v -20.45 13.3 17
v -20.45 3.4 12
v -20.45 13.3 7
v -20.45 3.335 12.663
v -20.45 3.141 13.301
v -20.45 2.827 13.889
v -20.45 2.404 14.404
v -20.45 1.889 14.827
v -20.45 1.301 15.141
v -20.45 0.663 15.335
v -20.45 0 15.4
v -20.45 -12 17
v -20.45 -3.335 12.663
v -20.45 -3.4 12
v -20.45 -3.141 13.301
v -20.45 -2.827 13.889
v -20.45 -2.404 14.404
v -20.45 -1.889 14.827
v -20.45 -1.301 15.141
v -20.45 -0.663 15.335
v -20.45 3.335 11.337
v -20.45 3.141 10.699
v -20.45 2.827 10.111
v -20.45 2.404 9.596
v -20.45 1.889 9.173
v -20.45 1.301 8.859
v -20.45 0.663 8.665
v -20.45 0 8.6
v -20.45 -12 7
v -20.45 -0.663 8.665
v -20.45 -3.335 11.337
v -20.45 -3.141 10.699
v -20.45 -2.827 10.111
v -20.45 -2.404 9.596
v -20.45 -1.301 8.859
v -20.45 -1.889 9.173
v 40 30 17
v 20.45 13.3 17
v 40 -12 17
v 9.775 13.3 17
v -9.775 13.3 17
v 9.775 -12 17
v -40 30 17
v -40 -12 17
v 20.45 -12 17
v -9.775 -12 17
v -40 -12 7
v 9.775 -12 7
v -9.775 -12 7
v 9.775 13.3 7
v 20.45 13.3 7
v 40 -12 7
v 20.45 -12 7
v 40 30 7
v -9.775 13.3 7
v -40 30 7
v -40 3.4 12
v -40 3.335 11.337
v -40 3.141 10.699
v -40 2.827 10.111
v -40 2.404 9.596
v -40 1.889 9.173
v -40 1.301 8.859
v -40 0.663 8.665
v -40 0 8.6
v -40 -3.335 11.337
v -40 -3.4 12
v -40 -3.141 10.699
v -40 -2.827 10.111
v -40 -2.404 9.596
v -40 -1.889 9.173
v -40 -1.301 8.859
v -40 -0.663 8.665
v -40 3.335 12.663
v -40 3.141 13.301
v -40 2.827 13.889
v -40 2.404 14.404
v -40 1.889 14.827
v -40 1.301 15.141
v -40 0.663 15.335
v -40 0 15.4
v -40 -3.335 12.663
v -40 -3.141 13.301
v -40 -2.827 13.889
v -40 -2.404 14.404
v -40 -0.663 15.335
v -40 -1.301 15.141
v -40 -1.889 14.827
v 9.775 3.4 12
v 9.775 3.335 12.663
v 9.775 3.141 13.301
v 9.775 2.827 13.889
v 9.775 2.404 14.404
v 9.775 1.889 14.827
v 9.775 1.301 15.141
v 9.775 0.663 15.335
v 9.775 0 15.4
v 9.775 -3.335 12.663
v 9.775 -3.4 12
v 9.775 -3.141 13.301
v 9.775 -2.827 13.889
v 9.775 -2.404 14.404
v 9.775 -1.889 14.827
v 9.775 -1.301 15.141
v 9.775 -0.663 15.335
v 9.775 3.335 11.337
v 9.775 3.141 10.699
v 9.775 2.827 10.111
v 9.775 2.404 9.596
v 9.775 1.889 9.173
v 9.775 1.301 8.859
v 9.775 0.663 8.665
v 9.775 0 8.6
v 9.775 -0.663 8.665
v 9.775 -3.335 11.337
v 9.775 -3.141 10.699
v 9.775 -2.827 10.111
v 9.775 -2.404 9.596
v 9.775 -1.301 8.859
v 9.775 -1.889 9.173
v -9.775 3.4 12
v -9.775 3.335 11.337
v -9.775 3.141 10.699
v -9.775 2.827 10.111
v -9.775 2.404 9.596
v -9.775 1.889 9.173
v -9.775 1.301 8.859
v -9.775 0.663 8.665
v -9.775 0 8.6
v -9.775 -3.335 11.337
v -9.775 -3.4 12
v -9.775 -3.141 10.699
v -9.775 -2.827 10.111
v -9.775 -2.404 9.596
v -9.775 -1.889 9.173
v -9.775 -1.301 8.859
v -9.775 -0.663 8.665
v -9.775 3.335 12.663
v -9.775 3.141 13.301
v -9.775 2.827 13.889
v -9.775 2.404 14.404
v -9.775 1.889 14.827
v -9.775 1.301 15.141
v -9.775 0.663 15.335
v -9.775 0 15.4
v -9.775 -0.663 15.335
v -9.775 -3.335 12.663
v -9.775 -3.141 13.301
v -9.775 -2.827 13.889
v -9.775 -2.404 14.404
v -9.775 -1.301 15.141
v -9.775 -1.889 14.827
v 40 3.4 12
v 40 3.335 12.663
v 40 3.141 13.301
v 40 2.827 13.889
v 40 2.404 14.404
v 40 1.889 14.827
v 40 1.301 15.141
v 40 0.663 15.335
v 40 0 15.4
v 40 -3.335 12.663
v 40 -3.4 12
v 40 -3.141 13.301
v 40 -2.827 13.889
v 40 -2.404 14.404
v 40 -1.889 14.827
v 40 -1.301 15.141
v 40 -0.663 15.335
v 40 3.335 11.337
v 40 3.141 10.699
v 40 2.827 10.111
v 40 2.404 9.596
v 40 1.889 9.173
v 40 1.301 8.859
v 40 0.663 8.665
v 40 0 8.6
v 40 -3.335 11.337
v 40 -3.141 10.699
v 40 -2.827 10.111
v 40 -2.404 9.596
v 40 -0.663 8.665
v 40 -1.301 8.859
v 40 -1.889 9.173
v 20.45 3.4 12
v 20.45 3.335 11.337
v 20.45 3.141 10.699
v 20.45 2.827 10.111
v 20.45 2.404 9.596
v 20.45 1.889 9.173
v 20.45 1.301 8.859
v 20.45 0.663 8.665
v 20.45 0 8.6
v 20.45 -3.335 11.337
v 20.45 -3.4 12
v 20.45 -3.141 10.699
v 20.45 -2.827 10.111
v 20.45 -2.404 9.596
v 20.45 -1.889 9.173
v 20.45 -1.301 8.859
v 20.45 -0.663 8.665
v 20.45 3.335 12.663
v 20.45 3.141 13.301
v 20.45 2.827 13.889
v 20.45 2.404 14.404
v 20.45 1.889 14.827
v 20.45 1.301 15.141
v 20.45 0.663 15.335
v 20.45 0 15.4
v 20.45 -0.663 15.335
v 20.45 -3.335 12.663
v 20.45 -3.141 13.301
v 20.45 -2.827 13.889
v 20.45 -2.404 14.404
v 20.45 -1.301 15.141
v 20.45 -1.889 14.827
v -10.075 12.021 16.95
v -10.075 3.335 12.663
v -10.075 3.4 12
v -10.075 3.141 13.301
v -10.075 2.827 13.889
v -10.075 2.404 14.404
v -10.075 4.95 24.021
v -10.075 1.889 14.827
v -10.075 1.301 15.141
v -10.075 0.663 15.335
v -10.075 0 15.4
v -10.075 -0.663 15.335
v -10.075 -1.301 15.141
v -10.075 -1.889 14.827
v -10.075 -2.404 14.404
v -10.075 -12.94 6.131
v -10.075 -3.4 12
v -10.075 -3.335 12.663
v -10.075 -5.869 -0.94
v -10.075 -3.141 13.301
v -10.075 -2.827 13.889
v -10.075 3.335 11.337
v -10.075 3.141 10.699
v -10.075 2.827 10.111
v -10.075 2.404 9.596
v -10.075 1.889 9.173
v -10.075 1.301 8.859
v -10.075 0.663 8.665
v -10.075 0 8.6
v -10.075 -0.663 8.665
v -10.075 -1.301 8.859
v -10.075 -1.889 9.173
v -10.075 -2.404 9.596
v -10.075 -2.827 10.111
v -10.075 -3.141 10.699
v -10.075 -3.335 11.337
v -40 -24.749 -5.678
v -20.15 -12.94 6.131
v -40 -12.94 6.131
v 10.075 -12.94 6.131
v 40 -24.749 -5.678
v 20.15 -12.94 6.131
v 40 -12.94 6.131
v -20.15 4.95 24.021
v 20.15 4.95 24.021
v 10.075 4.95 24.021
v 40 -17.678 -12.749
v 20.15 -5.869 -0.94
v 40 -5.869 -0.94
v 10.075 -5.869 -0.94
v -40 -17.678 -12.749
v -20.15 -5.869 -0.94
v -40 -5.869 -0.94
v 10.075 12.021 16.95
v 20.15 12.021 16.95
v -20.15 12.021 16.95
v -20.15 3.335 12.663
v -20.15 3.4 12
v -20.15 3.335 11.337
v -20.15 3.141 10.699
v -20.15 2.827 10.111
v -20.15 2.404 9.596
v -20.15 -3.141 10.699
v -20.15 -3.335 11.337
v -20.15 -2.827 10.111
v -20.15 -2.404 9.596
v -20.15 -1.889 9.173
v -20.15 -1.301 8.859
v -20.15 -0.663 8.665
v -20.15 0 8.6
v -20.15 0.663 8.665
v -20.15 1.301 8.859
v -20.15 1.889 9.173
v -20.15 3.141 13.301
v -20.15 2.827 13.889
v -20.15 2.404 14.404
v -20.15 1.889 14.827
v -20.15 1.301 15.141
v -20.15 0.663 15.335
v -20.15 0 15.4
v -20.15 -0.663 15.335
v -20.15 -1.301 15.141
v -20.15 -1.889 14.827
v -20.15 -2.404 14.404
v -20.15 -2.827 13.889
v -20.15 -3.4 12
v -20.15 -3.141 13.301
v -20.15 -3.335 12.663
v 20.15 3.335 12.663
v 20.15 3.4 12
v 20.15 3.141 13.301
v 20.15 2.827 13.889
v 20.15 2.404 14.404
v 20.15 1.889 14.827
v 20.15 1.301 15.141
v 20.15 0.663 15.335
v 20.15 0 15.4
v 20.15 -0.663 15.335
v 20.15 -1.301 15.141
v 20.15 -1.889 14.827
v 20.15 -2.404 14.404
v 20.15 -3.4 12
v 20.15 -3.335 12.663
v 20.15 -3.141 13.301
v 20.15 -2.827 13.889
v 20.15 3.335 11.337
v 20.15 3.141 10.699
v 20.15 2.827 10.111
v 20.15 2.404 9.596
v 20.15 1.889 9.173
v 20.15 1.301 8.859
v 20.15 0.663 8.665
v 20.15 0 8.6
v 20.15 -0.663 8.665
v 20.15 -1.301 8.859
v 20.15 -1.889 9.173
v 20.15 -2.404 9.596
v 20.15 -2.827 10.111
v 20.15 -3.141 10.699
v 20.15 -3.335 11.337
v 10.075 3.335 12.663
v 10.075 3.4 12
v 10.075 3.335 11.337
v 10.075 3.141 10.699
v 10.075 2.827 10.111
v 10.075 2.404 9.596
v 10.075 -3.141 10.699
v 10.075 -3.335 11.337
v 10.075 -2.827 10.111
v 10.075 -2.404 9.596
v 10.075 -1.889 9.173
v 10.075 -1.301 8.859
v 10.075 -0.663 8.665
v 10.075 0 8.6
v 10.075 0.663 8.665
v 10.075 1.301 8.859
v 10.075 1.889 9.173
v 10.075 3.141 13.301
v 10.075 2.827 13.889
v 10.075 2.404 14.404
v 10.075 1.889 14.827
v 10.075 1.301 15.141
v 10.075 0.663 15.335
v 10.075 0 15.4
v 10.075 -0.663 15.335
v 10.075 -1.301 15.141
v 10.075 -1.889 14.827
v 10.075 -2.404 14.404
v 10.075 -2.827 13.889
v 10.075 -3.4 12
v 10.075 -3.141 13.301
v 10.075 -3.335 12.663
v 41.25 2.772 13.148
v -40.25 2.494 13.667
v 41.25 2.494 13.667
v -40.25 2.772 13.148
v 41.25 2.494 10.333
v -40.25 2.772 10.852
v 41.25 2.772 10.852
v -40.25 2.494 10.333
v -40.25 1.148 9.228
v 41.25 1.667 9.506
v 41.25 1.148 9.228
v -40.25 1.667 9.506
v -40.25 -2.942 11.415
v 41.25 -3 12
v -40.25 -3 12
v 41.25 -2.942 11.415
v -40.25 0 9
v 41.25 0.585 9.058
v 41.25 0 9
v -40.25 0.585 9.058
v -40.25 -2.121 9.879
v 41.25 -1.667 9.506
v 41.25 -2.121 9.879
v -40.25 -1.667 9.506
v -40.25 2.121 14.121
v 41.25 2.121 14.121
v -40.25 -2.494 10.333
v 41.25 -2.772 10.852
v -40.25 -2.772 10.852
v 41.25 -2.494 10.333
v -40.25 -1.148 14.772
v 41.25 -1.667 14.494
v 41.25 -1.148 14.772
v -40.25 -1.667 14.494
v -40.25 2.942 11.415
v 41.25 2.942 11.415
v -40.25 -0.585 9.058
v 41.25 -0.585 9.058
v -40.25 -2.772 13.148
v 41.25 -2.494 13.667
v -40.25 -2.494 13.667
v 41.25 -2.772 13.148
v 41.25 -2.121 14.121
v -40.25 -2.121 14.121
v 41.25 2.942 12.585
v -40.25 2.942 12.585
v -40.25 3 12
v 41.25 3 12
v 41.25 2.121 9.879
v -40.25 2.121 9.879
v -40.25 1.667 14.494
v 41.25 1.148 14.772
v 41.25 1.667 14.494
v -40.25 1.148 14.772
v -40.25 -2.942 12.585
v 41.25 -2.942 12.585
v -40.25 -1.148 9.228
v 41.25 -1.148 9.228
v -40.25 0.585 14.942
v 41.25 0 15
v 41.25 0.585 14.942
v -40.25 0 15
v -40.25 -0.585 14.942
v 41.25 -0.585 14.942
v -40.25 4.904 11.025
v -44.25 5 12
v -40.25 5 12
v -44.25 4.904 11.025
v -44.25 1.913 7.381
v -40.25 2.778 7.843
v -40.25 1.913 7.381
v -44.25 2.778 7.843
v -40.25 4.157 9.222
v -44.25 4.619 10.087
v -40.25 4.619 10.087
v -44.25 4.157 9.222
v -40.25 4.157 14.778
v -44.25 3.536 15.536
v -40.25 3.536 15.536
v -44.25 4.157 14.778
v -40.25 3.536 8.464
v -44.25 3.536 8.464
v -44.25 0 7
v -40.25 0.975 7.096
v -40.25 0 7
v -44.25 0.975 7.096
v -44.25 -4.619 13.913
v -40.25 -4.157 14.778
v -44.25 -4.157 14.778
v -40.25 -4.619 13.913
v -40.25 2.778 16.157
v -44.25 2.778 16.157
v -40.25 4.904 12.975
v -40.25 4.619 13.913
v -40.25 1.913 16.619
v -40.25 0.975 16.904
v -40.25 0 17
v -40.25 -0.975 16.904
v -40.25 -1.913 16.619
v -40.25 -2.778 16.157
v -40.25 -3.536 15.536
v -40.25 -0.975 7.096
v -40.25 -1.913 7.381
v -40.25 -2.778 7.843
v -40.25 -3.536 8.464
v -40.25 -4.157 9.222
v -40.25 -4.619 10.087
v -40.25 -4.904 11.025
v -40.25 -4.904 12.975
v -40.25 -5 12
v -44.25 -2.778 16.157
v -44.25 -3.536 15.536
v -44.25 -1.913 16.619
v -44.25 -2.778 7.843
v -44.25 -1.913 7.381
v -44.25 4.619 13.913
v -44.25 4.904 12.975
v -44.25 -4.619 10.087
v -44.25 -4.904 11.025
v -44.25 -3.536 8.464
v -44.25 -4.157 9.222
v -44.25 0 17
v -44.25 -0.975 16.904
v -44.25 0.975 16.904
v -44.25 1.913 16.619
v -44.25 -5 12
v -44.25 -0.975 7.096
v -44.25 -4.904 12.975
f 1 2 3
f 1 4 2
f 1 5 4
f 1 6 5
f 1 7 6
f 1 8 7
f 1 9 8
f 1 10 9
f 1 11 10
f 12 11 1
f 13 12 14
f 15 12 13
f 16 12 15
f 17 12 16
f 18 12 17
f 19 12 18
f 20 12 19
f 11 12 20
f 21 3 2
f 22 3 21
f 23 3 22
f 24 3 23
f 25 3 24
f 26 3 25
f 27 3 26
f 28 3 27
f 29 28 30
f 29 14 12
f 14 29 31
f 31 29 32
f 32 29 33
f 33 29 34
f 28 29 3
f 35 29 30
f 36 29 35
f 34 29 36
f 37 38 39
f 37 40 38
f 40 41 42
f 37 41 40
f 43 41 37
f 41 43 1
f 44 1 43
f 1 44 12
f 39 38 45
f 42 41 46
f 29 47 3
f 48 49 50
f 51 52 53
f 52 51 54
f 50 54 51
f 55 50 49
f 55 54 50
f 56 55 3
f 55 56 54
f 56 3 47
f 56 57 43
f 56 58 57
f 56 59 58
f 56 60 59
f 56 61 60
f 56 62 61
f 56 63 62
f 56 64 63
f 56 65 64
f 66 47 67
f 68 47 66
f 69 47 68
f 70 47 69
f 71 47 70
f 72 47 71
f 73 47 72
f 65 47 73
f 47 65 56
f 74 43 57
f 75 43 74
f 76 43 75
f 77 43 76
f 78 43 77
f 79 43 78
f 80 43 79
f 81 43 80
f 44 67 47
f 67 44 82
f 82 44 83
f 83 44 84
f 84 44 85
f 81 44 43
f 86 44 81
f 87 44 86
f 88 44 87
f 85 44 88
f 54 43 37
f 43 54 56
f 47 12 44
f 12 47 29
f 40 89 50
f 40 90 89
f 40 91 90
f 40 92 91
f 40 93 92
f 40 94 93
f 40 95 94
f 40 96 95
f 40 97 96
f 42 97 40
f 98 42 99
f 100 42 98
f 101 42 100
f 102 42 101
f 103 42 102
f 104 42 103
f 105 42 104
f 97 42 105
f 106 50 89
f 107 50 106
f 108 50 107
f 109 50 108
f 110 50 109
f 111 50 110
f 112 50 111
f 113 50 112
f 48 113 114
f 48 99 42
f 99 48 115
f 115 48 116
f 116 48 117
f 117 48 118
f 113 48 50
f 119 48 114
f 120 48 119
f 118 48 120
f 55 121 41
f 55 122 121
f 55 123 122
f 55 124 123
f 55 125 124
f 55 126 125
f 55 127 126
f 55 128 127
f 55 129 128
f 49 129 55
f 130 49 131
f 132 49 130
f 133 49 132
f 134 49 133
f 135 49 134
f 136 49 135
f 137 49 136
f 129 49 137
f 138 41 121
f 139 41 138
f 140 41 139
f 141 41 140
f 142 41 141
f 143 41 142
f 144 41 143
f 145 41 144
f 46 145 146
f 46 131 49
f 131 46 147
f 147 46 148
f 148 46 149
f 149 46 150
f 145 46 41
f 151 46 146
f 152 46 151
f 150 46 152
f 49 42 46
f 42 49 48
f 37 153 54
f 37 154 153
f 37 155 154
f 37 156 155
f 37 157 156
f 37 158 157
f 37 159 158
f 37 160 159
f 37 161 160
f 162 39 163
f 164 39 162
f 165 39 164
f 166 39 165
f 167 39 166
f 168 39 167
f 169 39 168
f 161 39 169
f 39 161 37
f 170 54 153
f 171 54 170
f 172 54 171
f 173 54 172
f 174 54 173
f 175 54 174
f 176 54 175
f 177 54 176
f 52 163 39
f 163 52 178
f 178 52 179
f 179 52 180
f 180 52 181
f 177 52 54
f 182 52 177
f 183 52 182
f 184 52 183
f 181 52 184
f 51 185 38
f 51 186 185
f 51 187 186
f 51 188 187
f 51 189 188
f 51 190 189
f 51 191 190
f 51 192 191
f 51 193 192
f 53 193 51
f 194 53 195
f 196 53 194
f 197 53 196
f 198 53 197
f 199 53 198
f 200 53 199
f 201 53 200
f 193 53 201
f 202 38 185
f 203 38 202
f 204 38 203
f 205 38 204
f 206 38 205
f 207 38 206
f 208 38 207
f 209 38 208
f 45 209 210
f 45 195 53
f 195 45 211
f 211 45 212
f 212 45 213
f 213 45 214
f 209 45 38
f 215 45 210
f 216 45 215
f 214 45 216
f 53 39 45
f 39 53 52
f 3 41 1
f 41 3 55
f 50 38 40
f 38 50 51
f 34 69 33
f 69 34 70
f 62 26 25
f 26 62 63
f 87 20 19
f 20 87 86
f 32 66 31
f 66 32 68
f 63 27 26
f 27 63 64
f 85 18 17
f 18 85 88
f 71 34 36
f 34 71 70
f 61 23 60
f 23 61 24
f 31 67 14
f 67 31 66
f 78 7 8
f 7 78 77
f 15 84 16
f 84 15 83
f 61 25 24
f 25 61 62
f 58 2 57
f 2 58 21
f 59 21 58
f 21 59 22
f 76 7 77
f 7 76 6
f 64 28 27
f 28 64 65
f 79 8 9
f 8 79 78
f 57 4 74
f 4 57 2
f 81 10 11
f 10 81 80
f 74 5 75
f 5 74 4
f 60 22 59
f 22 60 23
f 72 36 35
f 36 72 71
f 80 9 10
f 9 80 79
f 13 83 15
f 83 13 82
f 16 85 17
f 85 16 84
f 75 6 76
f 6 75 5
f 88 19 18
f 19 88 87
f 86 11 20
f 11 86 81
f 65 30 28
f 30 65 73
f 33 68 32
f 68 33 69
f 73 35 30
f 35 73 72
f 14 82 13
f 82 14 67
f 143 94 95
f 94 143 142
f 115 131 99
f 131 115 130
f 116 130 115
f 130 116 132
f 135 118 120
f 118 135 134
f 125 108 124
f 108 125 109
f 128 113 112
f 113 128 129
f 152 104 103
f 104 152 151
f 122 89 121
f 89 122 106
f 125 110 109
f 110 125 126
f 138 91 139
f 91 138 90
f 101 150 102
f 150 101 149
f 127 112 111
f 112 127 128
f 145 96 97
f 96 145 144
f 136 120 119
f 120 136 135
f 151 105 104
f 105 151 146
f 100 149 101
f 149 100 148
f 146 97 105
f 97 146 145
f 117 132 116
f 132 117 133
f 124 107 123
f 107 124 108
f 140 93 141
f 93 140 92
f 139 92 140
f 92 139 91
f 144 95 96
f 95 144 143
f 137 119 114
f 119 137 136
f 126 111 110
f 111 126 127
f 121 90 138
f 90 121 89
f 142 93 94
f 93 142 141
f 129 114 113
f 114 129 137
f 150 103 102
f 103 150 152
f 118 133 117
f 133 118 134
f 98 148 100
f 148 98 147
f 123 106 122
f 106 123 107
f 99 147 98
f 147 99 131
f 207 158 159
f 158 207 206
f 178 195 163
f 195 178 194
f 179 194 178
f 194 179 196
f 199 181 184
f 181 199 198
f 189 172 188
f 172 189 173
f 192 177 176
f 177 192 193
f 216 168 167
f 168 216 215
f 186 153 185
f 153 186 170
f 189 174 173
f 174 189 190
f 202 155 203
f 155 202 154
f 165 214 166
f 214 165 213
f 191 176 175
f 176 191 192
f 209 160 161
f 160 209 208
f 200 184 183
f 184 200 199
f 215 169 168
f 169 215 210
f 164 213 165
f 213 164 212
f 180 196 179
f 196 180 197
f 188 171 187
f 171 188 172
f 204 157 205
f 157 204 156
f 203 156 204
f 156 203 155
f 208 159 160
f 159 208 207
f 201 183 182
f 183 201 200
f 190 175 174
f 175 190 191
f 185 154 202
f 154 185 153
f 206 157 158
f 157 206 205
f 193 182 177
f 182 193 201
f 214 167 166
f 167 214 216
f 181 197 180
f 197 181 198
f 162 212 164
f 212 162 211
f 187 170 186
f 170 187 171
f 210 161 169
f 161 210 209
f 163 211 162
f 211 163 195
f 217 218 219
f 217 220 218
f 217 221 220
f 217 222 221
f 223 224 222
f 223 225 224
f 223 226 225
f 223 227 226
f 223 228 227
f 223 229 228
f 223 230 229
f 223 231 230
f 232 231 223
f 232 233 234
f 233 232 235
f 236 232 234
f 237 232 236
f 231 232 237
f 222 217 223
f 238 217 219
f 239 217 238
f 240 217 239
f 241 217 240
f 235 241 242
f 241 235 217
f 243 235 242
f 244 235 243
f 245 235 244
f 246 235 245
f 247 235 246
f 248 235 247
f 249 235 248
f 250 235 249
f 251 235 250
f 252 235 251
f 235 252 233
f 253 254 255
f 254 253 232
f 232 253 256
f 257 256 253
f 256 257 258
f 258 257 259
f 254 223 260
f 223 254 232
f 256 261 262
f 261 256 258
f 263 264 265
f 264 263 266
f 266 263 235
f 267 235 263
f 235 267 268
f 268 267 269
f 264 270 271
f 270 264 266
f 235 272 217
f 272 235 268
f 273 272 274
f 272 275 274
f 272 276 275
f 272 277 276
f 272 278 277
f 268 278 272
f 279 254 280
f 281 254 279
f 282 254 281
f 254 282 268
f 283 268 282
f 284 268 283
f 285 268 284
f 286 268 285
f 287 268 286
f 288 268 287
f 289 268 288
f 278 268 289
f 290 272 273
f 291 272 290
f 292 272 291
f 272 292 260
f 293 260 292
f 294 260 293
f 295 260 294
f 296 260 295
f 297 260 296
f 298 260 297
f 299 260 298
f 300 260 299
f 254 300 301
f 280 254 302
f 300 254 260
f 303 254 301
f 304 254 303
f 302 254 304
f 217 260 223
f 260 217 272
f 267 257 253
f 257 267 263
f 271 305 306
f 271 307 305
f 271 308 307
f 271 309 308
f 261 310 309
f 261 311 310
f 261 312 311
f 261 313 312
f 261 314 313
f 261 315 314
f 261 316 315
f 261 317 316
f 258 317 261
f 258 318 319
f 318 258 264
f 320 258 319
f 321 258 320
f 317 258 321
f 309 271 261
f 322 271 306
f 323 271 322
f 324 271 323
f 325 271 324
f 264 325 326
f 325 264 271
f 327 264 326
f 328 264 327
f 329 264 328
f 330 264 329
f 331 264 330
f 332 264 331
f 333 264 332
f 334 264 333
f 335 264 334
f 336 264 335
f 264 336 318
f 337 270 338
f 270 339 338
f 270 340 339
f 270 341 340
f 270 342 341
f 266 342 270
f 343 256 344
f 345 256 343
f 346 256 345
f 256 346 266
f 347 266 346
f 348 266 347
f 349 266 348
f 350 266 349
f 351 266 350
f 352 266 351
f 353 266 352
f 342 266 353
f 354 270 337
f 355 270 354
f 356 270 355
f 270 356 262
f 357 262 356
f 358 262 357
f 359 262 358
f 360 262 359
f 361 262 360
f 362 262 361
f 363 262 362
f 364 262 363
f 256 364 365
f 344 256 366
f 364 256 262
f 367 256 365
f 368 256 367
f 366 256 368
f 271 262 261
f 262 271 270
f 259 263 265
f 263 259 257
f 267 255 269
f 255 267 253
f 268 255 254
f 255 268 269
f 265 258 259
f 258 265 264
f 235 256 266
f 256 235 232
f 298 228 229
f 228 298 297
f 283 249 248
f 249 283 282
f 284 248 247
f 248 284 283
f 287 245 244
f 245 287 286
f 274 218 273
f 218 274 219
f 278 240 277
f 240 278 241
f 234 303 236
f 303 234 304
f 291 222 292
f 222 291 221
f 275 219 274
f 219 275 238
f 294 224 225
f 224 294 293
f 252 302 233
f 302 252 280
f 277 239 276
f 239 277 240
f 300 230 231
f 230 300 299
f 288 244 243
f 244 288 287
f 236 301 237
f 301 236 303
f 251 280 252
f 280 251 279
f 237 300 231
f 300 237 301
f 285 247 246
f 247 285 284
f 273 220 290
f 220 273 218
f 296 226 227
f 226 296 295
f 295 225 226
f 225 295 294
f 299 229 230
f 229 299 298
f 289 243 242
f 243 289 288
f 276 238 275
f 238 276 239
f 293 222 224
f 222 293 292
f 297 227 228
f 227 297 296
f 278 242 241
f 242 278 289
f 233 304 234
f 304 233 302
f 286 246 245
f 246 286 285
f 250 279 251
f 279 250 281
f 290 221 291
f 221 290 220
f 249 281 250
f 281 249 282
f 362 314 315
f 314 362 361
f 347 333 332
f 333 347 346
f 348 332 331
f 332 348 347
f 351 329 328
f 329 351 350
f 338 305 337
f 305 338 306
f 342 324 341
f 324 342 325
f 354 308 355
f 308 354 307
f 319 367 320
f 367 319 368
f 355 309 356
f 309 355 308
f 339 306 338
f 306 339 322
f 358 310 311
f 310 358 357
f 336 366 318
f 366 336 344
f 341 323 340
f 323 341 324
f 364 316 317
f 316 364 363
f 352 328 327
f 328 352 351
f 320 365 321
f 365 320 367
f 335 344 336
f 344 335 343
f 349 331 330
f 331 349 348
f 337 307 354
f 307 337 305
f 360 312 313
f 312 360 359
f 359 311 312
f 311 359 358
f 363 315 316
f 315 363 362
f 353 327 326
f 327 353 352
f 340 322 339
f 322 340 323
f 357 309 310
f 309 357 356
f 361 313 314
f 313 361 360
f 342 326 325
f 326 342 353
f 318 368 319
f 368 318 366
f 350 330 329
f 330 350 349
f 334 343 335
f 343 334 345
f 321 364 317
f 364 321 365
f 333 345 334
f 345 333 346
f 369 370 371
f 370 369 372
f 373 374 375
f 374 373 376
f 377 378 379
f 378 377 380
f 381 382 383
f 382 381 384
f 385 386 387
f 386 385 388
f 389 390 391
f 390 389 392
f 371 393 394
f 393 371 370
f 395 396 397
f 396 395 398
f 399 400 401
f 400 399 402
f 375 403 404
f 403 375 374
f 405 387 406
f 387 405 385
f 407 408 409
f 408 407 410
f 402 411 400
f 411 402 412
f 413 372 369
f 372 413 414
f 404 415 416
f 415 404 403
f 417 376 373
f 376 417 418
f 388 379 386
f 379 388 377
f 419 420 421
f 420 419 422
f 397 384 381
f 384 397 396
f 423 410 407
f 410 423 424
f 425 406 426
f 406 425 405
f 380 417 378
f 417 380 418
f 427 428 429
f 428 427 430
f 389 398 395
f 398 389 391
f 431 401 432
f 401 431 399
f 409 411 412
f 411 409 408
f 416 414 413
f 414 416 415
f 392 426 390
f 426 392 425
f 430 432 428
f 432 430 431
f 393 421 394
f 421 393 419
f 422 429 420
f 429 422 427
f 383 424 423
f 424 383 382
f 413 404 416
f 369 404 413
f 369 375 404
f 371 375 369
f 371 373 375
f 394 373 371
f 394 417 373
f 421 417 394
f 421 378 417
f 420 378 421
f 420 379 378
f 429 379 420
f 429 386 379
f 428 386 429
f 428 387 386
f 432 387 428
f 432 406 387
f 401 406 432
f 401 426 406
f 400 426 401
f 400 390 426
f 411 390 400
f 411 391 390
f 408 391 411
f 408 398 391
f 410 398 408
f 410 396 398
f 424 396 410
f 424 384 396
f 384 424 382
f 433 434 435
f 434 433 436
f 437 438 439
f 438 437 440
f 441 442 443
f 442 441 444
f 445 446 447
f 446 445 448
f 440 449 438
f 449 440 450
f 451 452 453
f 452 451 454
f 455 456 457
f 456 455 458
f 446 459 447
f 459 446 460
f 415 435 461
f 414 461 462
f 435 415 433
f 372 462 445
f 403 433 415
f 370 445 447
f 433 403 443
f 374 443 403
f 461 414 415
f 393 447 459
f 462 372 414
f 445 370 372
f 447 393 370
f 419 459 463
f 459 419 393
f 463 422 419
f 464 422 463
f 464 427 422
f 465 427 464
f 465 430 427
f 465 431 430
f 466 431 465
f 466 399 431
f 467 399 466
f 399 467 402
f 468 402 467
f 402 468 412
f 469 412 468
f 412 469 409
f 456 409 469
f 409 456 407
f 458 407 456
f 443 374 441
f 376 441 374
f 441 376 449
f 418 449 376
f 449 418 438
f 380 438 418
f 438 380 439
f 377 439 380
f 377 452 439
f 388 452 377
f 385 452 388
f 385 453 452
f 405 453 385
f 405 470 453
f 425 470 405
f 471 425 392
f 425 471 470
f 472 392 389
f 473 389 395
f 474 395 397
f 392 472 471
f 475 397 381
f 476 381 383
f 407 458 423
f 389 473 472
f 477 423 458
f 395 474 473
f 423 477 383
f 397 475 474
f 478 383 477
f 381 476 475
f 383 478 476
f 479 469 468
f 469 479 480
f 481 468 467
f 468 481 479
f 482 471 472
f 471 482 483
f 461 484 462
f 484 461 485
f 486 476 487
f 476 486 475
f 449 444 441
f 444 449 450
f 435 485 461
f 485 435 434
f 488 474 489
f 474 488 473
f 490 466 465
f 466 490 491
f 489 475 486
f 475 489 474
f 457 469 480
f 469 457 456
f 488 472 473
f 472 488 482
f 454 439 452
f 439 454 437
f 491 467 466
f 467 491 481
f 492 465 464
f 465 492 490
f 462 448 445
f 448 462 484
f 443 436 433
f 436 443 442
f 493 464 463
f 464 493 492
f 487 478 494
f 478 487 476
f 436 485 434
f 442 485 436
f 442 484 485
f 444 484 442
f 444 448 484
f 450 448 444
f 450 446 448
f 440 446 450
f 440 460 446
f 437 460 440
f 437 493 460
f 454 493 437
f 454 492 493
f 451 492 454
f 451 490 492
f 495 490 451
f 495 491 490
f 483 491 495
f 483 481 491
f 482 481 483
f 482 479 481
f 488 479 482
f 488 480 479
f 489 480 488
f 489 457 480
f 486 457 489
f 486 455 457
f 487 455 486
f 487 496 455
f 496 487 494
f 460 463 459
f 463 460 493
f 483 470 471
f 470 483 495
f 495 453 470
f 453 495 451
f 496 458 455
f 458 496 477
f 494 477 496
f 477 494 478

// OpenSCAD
$fn = 32;

// ------------------------------------------------------------------------
// Butt hinge: hinge 80 mm, leaf swung 45 deg
// Every part is its own module, assembly() places every instance.
// ------------------------------------------------------------------------

// --- part 1 ---
module hinge_base() {
  difference() {
    union() {
      translate([-40, -12, -5]) cube([19.55, 42, 10]);
      translate([-9.775, -12, -5]) cube([19.55, 42, 10]);
      translate([20.45, -12, -5]) cube([19.55, 42, 10]);
      translate([-40, 13.3, -5]) cube([80, 16.7, 10]);
    }
    translate([-30.225, 0, 0]) rotate([0, 90, 0]) cylinder(h = 21.55, d = 6.8, center = true);
    translate([0, 0, 0]) rotate([0, 90, 0]) cylinder(h = 21.55, d = 6.8, center = true);
    translate([30.225, 0, 0]) rotate([0, 90, 0]) cylinder(h = 21.55, d = 6.8, center = true);
  }
}

// --- part 2 ---
module hinge_mover() {
  difference() {
    union() {
      translate([-20.15, -30, -5]) cube([10.075, 42, 10]);
      translate([10.075, -30, -5]) cube([10.075, 42, 10]);
      translate([-40, -30, -5]) cube([80, 16.7, 10]);
    }
    translate([-15.113, 0, 0]) rotate([0, 90, 0]) cylinder(h = 12.075, d = 6.8, center = true);
    translate([15.113, 0, 0]) rotate([0, 90, 0]) cylinder(h = 12.075, d = 6.8, center = true);
  }
}

// --- part 3 ---
module hinge_pin() {
  rotate([0, 90, 0]) cylinder(h = 82.5, d = 6, center = true);
  translate([-44.25, 0, 0]) rotate([0, 90, 0]) cylinder(h = 4, d = 10);
}

// --- assembly ---
module assembly() {
  color([0.80, 0.24, 0.20]) translate([0, 0, 12]) rotate([0, 0, 0]) hinge_base();
  color([0.20, 0.45, 0.75]) translate([0, 0, 12]) rotate([45, 0, 0]) hinge_mover();
  color([0.25, 0.62, 0.32]) translate([0, 0, 12]) rotate([0, 0, 0]) hinge_pin();
}

assembly();
